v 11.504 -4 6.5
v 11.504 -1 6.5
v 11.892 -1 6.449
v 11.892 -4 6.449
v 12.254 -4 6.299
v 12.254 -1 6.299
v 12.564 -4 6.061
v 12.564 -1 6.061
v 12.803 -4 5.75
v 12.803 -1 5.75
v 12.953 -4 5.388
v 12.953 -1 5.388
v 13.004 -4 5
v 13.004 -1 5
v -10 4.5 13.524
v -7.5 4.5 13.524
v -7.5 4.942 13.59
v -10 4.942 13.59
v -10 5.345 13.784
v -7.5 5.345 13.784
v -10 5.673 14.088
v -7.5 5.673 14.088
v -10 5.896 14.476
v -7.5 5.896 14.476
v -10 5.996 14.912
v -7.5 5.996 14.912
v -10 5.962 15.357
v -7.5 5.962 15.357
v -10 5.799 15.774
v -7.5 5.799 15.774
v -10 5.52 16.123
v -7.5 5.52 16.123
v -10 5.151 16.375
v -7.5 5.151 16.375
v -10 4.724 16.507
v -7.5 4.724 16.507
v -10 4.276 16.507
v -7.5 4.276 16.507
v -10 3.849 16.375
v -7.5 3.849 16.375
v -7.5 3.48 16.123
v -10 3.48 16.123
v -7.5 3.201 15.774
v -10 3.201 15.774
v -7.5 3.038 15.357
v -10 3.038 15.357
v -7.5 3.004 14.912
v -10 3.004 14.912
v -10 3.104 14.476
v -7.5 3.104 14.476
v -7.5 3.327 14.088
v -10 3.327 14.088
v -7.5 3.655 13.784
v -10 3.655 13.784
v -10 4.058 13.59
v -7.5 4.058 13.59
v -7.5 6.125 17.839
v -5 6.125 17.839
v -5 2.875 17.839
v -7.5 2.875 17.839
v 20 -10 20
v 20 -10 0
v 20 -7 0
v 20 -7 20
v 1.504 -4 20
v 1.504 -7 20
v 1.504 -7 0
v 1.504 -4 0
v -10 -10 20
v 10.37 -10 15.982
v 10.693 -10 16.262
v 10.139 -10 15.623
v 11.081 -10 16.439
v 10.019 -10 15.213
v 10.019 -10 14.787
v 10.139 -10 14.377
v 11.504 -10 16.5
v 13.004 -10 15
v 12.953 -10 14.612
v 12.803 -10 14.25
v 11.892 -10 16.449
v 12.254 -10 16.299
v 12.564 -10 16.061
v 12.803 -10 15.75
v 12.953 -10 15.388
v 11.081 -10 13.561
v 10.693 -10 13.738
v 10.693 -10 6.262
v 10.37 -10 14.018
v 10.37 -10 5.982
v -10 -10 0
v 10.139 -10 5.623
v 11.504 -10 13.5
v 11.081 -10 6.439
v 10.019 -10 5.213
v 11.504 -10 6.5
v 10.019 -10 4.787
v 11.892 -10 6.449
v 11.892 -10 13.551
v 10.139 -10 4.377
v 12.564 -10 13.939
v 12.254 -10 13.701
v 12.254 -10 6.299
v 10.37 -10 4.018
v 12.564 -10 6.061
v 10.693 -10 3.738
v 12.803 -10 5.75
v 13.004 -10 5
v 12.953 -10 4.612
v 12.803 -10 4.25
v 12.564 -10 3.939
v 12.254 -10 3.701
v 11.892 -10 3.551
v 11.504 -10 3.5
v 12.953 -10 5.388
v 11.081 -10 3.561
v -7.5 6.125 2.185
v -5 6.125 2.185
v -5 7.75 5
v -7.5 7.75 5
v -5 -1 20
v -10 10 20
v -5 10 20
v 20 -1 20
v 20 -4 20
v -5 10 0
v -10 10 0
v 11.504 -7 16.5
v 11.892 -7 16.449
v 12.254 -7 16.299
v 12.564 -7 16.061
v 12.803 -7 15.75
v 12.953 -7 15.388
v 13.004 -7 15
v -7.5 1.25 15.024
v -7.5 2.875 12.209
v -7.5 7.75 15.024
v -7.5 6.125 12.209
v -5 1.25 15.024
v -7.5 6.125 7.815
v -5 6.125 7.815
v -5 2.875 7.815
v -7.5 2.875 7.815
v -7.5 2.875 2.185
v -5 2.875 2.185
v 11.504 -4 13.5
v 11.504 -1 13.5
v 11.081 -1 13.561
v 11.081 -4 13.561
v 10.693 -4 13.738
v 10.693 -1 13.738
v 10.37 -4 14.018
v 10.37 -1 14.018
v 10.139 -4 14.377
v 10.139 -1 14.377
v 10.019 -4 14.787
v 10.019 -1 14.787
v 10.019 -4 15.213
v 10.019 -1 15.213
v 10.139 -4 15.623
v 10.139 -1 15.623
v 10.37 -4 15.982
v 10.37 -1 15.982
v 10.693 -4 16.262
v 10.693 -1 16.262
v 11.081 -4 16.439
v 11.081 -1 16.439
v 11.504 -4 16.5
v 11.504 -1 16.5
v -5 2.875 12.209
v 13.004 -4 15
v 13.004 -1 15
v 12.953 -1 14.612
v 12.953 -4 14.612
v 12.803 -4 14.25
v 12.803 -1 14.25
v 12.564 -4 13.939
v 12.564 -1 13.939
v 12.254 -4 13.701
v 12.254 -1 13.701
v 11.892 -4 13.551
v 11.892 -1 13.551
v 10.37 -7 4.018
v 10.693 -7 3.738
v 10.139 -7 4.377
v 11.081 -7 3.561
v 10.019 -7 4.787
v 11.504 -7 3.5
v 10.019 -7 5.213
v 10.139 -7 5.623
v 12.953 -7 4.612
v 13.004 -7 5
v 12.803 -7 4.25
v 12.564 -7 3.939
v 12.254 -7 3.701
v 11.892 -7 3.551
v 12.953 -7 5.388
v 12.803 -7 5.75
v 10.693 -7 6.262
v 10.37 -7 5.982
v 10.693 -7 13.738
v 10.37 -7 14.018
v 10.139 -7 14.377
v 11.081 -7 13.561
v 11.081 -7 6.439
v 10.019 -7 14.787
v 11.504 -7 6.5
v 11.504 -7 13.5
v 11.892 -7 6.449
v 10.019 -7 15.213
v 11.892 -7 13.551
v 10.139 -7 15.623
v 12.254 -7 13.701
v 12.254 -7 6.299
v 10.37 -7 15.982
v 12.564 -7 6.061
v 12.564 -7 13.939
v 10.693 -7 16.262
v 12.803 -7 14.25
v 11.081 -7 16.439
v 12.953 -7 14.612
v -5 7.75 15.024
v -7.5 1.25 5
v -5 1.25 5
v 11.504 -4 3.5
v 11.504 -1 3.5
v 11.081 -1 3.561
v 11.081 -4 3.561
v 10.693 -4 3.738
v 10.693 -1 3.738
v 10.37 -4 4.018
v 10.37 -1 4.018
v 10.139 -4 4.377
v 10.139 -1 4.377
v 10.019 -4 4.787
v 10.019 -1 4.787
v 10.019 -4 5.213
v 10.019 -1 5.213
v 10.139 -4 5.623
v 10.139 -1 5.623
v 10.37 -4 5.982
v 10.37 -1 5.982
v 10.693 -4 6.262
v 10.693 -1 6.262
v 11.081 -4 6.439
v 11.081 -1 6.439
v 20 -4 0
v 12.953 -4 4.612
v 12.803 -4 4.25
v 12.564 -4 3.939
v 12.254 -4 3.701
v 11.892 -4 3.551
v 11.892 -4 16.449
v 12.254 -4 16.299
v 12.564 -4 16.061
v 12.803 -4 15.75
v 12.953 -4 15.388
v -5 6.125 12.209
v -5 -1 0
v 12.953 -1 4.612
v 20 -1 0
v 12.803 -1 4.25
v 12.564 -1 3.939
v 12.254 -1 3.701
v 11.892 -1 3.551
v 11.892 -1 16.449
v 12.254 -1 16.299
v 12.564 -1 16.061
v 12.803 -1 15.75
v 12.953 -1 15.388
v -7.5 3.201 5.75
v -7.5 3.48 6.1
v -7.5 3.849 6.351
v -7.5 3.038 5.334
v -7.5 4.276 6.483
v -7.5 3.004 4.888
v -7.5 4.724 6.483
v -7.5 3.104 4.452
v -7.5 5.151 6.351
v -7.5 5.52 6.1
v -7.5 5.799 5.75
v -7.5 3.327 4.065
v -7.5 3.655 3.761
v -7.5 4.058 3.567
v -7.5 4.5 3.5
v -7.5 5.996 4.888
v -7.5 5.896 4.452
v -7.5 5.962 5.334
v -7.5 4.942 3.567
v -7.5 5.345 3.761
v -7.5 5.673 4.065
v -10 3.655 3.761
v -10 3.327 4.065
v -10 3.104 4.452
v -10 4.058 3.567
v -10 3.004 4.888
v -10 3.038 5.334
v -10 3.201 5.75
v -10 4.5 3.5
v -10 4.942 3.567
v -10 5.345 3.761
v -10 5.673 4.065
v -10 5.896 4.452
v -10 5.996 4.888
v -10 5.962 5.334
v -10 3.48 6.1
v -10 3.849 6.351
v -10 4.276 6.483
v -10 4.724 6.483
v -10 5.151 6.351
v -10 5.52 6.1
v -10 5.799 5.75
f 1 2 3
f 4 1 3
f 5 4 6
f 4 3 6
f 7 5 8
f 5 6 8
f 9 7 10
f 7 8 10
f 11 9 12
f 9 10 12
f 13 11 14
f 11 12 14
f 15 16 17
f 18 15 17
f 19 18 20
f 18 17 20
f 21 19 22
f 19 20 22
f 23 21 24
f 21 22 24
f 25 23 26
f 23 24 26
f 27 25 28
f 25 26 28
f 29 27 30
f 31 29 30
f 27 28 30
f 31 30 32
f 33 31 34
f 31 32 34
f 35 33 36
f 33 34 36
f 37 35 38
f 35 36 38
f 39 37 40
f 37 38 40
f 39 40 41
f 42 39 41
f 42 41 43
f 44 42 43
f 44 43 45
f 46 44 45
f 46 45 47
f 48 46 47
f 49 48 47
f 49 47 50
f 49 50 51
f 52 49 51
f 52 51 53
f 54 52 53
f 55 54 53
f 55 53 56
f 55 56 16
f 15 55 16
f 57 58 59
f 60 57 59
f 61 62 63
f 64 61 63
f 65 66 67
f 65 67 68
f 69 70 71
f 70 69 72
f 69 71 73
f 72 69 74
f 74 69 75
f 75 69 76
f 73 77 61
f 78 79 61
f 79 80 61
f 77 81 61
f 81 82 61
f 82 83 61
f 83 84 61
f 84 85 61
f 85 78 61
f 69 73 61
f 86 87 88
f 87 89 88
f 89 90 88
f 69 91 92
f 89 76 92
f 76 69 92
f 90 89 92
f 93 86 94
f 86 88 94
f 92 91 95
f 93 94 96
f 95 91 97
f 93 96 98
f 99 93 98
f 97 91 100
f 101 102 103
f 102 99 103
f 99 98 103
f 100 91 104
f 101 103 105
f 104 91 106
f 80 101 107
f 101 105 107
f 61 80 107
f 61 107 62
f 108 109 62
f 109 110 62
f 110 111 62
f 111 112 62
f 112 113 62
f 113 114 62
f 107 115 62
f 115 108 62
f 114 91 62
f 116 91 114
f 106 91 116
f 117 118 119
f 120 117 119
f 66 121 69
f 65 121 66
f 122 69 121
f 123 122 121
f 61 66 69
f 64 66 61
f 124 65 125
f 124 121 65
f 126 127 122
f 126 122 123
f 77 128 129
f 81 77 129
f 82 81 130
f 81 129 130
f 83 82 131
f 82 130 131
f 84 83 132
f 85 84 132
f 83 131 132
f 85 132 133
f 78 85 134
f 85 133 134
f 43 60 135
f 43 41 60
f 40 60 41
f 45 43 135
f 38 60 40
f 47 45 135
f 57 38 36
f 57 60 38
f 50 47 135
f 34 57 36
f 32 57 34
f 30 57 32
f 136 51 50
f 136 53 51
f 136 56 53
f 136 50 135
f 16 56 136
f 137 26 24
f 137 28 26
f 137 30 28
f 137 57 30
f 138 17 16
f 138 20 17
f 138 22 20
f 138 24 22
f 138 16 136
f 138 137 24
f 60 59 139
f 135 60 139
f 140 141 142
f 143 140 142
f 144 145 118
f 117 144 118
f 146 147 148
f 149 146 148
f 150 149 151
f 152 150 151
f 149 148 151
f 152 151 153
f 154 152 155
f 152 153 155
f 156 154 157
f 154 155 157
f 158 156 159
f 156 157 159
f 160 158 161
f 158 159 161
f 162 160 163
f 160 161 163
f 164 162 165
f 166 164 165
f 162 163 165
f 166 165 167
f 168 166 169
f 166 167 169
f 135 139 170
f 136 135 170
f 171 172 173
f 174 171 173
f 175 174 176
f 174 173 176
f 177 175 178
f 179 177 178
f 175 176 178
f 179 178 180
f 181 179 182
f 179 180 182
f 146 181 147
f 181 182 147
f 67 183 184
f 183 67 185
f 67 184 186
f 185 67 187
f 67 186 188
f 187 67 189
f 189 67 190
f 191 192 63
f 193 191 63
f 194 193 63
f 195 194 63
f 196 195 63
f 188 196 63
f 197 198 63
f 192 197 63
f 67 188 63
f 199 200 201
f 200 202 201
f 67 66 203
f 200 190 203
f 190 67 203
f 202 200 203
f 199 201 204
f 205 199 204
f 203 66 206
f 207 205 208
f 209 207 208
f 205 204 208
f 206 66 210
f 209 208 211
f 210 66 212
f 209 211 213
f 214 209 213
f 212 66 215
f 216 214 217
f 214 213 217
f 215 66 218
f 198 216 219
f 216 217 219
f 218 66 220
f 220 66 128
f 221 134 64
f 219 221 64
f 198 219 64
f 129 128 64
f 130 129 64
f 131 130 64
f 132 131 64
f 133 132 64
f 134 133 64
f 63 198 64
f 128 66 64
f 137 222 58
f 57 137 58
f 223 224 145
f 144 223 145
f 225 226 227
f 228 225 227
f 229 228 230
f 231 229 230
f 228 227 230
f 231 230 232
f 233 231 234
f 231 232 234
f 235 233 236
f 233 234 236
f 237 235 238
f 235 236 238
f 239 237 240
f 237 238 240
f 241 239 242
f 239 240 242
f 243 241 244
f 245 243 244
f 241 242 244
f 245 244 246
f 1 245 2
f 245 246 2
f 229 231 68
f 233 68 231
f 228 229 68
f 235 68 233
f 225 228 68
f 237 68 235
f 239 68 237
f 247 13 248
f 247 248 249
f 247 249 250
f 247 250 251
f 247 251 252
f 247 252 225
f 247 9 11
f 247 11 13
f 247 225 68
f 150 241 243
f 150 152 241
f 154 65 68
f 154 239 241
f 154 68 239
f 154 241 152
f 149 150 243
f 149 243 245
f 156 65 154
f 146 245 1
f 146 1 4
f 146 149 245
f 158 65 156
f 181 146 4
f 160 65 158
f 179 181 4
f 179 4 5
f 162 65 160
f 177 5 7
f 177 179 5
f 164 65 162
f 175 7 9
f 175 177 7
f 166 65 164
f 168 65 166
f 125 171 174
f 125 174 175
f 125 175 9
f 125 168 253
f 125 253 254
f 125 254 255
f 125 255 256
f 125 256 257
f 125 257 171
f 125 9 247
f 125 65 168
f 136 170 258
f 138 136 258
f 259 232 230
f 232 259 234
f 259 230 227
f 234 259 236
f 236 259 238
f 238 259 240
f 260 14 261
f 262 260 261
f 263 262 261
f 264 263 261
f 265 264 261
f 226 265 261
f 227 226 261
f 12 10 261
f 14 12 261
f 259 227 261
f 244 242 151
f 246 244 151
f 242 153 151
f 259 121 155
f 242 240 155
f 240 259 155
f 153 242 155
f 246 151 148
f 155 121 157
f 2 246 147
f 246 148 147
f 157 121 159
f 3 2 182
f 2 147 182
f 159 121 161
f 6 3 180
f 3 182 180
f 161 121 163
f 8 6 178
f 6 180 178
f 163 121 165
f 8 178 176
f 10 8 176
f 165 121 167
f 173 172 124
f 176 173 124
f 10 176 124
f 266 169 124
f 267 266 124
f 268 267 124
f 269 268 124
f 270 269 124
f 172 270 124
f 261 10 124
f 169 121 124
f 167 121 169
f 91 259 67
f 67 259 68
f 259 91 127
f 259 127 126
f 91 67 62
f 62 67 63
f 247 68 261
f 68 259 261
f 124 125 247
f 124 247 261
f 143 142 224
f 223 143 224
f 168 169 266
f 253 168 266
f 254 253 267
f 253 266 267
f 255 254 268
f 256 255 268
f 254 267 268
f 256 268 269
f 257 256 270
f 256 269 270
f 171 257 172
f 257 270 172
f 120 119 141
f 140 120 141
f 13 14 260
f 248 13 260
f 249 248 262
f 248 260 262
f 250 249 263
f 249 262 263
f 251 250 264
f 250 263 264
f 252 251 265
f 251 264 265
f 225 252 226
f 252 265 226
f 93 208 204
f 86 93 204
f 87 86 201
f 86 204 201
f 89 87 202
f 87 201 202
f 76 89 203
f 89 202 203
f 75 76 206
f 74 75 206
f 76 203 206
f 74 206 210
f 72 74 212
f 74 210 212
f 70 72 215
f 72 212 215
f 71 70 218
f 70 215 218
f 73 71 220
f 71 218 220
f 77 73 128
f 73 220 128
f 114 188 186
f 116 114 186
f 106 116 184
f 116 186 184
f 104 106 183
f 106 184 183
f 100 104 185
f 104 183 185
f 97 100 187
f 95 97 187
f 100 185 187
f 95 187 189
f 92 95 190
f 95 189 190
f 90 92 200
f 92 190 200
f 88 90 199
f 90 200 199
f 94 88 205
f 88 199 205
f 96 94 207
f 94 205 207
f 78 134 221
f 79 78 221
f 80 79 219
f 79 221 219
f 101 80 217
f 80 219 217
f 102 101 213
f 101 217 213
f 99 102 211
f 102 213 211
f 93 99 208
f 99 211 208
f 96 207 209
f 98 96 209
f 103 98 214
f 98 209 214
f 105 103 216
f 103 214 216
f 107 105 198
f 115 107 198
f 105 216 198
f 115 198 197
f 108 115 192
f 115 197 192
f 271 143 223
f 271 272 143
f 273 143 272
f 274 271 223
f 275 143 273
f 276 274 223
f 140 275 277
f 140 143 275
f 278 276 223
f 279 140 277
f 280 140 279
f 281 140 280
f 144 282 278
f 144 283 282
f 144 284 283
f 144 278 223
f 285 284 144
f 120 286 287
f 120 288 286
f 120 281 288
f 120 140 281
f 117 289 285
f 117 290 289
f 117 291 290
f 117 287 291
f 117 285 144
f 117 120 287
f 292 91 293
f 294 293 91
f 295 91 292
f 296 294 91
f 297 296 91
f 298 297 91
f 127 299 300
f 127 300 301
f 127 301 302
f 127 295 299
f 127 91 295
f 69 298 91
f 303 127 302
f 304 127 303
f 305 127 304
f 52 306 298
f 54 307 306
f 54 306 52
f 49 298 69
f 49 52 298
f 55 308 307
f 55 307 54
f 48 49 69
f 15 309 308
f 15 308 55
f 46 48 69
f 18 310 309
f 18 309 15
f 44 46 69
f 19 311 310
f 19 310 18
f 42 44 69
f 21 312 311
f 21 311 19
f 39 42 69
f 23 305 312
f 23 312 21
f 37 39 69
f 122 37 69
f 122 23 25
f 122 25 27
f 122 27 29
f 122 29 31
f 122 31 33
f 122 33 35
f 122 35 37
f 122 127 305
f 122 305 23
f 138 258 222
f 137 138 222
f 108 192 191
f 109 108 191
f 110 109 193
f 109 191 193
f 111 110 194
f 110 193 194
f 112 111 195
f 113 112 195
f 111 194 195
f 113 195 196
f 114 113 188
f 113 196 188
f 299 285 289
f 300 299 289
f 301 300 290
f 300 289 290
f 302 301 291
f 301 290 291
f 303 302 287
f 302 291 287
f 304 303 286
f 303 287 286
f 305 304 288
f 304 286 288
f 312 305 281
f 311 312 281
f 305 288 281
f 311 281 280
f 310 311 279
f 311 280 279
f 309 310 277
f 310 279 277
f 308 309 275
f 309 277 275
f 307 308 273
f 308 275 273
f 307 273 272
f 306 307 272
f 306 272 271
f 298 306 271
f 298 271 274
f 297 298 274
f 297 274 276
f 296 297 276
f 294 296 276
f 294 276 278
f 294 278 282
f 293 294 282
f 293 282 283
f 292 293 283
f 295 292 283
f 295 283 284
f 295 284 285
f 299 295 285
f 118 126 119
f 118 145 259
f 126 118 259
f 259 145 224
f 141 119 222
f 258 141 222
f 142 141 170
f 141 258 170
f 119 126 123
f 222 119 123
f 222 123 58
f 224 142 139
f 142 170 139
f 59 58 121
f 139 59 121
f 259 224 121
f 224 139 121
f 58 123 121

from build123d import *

# Parameters (mm, degrees)
SKETCH2_W           = 40
SKETCH2_H           = 20
BOSS_EXTRUDE2_DEPTH = 20
SKETCH3_W           = 20
SKETCH3_H           = 20
CUT_EXTRUDE1_DEPTH  = 10
SKETCH4_W           = 18.496290815
SKETCH4_H           = 3
CUT_EXTRUDE2_DEPTH  = 31
SKETCH5_R           = 1.5
CUT_EXTRUDE3_DEPTH  = 34.541019662
SKETCH8_R           = 1.5
CUT_EXTRUDE4_DEPTH  = 2.5
CUT_EXTRUDE6_DEPTH  = 31.347981811


with BuildPart() as part:
    # Sketch2 → Boss-Extrude2 (new body)
    with BuildSketch(Plane.XY):
        Rectangle(SKETCH2_W, SKETCH2_H)
    extrude(amount=BOSS_EXTRUDE2_DEPTH)

    # Sketch3 → Cut-Extrude1 (cut)
    with BuildSketch(Plane.ZY.offset(20)):
        with Locations((10, 0)):
            Rectangle(SKETCH3_W, SKETCH3_H)
    extrude(amount=-CUT_EXTRUDE1_DEPTH, mode=Mode.SUBTRACT)

    # Sketch4 → Cut-Extrude2 (cut, through all)
    with BuildSketch(Plane.XY.offset(20)):
        Polygon((-5, -1), (20, -1), (20, 0), (20, 10), (-5, 10), align=None)
        with Locations((10.751854593, -5.5)):
            Rectangle(SKETCH4_W, SKETCH4_H)
    extrude(amount=-CUT_EXTRUDE2_DEPTH, mode=Mode.SUBTRACT)

    # Sketch5 → Cut-Extrude3 (cut, through all)
    with BuildSketch(Plane(origin=(-5, 0, 0), x_dir=(0, 0, -1), z_dir=(1, 0, 0))):
        with Locations((-15.023649692, 4.5)):
            Circle(SKETCH5_R)
        with Locations((-5, 4.5)):
            Circle(SKETCH5_R)
    extrude(amount=-CUT_EXTRUDE3_DEPTH, mode=Mode.SUBTRACT)

    # Sketch8 → Cut-Extrude4 (cut)
    # profile 1 of 2: a face of its own
    with BuildSketch(Plane(origin=(-5, 0, 0), x_dir=(0, 0, -1), z_dir=(1, 0, 0))):
        Polygon((-12.208649692, 2.874758992), (-12.208649692, 6.125241008), (-15.023649692, 7.750482016), (-17.838649692, 6.125241008), (-17.838649692, 2.874758992), (-15.023649692, 1.249517984), align=None)
        with Locations((-15.023649692, 4.5)):
            Circle(SKETCH8_R, mode=Mode.SUBTRACT)
    # profile 2 of 2: a face of its own
    with BuildSketch(Plane(origin=(-5, 0, 0), x_dir=(0, 0, -1), z_dir=(1, 0, 0))):
        Polygon((-2.185, 2.874758992), (-2.185, 6.125241008), (-5, 7.750482016), (-7.815, 6.125241008), (-7.815, 2.874758992), (-5, 1.249517984), align=None)
        with Locations((-5, 4.5)):
            Circle(SKETCH8_R, mode=Mode.SUBTRACT)
    extrude(amount=-CUT_EXTRUDE4_DEPTH, mode=Mode.SUBTRACT)

    # Sketch9 → Cut-Extrude6 (cut, through all)
    with BuildSketch(Plane(origin=(0, -1, 0), x_dir=(1, 0, 0), z_dir=(0, 1, 0))):
        with BuildLine():
            ThreePointArc((11.503709185, -3.5), (10.003709185, -5), (11.503709185, -6.5))
            Line((11.503709185, -6.5), (11.503709185, -3.5))
        make_face()
        with BuildLine():
            Line((11.503709185, -3.5), (11.503709185, -6.5))
            ThreePointArc((11.503709185, -6.5), (12.564369357, -6.060660172), (13.003709185, -5))
            ThreePointArc((13.003709185, -5), (12.564369357, -3.939339828), (11.503709185, -3.5))
        make_face()
        with BuildLine():
            ThreePointArc((11.503709185, -13.5), (10.003709185, -15), (11.503709185, -16.5))
            Line((11.503709185, -16.5), (11.503709185, -13.5))
        make_face()
        with BuildLine():
            Line((11.503709185, -13.5), (11.503709185, -16.5))
            ThreePointArc((11.503709185, -16.5), (12.564369357, -16.060660172), (13.003709185, -15))
            ThreePointArc((13.003709185, -15), (12.564369357, -13.939339828), (11.503709185, -13.5))
        make_face()
    extrude(amount=-CUT_EXTRUDE6_DEPTH, mode=Mode.SUBTRACT)


solid = part.part
